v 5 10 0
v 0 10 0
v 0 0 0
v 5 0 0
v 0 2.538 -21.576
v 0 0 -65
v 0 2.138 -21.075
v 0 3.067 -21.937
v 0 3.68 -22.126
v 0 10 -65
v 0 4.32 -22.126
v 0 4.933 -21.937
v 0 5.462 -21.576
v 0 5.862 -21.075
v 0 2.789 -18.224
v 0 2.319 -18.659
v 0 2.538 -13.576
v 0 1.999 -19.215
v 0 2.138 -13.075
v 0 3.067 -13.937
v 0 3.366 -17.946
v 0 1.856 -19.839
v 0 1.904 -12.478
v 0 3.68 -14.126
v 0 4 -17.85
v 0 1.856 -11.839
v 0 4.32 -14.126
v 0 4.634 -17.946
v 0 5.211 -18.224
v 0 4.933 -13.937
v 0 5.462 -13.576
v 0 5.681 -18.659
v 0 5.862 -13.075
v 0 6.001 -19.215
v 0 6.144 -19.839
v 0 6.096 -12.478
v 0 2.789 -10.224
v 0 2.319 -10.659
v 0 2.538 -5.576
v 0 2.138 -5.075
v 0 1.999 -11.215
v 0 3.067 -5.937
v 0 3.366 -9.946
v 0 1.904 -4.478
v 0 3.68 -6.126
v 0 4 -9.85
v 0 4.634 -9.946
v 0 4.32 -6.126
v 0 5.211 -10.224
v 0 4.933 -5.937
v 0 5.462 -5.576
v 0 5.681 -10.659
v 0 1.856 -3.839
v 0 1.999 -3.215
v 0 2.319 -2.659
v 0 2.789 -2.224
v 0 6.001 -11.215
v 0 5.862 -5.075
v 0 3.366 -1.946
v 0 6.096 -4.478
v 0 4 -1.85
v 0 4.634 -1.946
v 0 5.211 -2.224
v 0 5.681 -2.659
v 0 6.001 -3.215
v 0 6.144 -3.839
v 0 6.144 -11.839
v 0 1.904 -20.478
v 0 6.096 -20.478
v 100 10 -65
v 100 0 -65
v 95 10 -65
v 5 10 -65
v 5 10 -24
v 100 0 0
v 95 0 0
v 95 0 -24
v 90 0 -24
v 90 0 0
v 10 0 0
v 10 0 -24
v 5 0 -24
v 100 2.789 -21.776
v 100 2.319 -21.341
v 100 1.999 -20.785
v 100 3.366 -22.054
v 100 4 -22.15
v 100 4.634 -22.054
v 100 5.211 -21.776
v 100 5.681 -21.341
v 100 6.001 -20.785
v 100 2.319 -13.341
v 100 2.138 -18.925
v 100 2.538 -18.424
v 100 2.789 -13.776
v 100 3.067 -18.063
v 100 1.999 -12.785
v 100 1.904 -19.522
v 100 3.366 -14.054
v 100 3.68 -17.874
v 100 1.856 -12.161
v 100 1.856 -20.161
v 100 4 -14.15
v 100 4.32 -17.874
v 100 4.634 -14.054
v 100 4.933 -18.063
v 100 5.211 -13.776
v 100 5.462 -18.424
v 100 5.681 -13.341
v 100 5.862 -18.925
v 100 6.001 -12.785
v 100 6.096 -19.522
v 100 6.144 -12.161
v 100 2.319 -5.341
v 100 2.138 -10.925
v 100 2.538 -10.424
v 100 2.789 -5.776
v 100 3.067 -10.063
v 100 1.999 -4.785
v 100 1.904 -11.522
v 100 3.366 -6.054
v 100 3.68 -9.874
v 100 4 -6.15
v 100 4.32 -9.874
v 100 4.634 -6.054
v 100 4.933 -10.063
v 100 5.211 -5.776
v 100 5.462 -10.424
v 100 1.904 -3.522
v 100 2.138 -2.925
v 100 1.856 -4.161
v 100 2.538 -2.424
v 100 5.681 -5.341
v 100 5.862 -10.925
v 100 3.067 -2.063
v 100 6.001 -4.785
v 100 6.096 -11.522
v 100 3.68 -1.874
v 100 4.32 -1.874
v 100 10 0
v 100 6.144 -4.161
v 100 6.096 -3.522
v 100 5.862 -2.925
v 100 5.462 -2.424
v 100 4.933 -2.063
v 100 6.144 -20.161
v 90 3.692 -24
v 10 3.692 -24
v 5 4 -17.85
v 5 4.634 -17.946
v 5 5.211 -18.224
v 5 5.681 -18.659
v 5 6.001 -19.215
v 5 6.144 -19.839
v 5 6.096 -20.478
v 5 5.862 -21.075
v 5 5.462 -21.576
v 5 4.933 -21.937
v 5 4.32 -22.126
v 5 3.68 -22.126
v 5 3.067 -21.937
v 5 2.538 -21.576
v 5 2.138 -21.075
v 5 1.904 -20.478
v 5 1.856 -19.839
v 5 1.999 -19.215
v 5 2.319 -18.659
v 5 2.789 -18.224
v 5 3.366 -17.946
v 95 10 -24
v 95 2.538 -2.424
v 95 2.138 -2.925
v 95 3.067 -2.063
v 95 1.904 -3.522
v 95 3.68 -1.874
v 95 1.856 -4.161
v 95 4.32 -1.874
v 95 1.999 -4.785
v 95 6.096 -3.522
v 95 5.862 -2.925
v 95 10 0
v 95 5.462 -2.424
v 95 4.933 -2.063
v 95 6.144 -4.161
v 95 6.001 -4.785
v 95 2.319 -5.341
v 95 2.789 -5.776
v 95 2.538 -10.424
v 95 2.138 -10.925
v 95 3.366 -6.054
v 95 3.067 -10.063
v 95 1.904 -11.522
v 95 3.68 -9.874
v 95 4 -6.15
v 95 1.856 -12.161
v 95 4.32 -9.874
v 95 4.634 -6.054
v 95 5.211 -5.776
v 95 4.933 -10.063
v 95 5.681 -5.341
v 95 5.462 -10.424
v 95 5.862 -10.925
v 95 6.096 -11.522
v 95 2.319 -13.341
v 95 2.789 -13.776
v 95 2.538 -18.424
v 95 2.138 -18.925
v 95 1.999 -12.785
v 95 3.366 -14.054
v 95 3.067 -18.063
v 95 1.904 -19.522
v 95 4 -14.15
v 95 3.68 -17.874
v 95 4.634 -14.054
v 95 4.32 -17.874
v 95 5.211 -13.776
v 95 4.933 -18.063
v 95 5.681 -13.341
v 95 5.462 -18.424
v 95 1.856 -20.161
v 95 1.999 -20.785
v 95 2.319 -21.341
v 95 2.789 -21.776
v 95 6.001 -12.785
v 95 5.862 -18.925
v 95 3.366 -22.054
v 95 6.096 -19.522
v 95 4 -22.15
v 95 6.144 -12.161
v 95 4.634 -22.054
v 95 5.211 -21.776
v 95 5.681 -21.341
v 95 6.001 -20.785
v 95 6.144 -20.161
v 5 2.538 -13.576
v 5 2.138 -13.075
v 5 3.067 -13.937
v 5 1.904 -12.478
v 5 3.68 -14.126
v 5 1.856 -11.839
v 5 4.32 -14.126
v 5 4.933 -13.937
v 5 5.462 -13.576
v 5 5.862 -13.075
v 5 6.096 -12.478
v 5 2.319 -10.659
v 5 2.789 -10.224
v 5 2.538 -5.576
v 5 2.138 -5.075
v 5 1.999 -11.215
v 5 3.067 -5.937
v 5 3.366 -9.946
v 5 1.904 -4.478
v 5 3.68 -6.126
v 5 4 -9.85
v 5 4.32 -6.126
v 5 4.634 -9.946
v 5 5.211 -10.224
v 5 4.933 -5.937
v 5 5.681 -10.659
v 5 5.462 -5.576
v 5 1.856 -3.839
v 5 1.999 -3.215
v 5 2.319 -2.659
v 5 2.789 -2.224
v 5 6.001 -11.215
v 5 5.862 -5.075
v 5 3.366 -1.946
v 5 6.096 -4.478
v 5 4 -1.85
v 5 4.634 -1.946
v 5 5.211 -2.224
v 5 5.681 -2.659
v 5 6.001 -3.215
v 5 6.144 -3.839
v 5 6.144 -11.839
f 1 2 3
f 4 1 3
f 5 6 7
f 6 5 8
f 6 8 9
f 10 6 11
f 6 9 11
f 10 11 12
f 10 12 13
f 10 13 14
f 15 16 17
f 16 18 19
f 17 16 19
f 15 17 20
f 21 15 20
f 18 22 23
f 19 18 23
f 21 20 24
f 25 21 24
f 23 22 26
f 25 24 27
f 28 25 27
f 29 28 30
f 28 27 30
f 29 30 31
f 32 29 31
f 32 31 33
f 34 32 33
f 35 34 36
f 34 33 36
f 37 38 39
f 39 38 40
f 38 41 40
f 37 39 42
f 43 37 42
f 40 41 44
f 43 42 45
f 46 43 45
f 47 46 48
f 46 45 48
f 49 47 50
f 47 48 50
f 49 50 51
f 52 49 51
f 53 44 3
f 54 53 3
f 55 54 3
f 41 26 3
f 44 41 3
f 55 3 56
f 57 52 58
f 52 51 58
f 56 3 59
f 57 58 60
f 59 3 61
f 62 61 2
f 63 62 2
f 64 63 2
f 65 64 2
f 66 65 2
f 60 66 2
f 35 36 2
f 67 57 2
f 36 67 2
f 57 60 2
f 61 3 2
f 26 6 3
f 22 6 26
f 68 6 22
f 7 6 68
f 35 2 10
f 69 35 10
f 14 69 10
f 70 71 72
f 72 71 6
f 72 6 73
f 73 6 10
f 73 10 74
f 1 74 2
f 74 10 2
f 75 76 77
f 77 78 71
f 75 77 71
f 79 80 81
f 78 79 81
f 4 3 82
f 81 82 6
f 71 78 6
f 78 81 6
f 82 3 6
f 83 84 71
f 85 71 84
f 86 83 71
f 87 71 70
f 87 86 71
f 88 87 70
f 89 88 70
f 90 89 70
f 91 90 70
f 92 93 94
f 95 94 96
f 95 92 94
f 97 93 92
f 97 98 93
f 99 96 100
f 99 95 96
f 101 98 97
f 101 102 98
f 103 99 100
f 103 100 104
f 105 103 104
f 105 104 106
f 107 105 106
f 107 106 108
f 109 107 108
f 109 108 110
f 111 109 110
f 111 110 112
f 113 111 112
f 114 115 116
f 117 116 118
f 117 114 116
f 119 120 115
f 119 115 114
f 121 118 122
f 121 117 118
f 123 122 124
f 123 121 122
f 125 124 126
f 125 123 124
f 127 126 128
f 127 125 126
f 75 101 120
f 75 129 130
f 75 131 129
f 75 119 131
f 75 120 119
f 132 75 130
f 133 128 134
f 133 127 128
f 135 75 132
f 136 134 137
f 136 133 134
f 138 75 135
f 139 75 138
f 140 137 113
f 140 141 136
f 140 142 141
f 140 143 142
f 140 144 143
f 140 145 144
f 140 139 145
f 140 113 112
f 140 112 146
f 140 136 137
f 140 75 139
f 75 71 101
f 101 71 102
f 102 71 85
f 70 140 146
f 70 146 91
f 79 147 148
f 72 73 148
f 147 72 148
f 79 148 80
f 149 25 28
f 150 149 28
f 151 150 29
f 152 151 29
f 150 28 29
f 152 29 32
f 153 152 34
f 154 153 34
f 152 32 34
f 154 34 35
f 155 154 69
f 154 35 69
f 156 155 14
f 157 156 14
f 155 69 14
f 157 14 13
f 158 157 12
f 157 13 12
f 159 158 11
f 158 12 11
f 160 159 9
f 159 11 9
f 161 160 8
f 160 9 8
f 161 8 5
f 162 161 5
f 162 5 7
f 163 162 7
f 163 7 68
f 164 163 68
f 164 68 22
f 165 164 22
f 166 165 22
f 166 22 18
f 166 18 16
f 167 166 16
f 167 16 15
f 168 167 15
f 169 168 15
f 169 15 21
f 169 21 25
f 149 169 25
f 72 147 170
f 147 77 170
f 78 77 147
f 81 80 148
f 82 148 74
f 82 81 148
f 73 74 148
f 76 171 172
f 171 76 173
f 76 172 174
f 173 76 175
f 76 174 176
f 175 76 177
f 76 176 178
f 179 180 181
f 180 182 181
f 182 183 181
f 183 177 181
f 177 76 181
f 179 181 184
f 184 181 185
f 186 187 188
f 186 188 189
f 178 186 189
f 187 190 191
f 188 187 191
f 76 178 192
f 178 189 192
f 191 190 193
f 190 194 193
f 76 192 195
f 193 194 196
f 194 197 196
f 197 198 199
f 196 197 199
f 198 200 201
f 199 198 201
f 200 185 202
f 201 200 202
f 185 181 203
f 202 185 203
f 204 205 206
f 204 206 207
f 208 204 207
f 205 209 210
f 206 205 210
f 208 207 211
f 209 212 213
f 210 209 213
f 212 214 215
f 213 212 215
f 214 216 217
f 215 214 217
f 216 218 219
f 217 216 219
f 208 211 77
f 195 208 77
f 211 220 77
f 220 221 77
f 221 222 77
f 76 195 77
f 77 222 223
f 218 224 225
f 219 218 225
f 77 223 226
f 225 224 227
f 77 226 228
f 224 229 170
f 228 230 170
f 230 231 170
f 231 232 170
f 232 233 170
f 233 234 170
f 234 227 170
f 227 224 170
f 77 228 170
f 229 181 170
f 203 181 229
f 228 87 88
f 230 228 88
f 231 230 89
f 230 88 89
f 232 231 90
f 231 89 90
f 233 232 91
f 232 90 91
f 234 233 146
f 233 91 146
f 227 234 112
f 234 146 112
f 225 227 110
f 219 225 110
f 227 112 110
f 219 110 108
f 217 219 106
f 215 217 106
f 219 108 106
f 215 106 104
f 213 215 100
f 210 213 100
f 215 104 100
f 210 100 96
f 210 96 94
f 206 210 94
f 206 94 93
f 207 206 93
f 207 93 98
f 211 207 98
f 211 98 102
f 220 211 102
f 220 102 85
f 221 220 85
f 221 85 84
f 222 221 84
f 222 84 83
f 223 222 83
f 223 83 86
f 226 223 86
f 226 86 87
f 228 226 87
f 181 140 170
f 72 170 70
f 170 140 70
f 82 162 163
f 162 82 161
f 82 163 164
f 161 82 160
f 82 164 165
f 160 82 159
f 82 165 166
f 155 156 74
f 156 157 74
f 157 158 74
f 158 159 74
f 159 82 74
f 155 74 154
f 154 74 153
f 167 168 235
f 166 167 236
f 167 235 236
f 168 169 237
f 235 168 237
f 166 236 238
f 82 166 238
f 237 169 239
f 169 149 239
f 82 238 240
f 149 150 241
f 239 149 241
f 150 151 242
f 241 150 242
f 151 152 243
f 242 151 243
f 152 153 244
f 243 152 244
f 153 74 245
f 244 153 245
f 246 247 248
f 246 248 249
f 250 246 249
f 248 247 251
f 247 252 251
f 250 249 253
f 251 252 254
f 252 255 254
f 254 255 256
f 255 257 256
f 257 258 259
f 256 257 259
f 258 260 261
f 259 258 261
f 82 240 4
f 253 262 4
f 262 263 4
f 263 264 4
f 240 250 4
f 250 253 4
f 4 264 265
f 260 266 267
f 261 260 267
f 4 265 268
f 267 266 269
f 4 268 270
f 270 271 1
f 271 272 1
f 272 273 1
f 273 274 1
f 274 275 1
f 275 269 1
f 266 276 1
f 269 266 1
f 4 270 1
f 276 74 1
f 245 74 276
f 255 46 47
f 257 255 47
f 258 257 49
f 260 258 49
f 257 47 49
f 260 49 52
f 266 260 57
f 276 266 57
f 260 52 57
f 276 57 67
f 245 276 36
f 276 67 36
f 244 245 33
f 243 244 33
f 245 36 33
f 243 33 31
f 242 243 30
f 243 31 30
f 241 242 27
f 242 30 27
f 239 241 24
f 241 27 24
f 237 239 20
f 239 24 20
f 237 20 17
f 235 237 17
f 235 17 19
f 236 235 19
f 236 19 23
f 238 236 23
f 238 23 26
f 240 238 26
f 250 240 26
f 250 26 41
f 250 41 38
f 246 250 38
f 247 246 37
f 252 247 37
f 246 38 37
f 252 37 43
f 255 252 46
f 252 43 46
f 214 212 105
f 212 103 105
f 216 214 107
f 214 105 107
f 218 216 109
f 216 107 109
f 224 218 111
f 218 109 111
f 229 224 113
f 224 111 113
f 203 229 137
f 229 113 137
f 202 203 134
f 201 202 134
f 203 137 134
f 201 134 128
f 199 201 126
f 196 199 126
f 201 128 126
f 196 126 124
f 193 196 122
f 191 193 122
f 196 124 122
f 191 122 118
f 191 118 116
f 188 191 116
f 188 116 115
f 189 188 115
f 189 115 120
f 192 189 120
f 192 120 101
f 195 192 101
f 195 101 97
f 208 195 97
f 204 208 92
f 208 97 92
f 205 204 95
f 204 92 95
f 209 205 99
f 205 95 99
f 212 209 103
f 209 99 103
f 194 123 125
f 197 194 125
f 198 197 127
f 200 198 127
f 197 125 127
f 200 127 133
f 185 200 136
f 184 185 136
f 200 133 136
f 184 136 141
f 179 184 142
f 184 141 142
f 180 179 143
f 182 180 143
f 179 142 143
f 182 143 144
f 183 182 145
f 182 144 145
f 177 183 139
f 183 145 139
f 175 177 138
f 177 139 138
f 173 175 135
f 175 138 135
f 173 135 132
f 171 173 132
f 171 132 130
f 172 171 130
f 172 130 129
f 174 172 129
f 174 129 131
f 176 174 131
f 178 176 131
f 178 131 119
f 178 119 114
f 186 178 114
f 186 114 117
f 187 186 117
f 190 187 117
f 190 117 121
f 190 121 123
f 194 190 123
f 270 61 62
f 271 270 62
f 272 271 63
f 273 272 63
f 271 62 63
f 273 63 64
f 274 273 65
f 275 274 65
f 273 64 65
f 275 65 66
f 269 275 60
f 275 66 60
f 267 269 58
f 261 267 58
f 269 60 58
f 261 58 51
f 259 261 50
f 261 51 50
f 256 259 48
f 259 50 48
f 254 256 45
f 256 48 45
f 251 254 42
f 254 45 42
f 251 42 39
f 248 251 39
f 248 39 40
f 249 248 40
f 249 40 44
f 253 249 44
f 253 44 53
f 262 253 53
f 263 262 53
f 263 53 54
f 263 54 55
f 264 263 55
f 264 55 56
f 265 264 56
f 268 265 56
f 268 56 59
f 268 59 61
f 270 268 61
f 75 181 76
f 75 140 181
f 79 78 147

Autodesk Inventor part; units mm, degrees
ref_plane "YZ Plane" through (0, 0, 0) normal (1, 0, 0) x (0, 1, 0)
ref_plane "XZ Plane" through (0, 0, 0) normal (0, 1, 0) x (-1, 0, 0)
ref_plane "XY Plane" through (0, 0, 0) normal (0, 0, 1) x (1, 0, 0)
sketch "Sketch1" plane through (0, 0, 0) normal (0, 1, 0) x (-1, 0, 0)
  point P0 (0, 0)
sketch "Sketch2" plane through (0, 0, 0) normal (1, 0, 0) x (0, 1, 0)
  line L0 (0, 0) -> (0, -65)
  line L1 (0, -65) -> (10, -65)
  line L2 (10, -65) -> (0, 0)
  dimension "d0" = 65
  dimension "d2" = 10
extrude "Extrusion1" add sketch "Sketch2" along normal blind 100
sketch "Sketch3" plane through (100, 0, 0) normal (1, 0, 0) x (0, 0, -1)
  line L0 (65, 10) -> (0, 0) projected
  line L1 (0, 0) -> (24, 0)
  line L2 (24, 0) -> (24, 3.6923)
  line L3 (24, 10) -> (0, 10)
  line L4 (0, 10) -> (0, 0)
  circle A0 centre (4, 4) radius 2.15
  circle A1 centre (12, 4) radius 2.15
  circle A2 centre (20, 4) radius 2.15
  line L5 (24, 10) -> (65, 10)
  line L6 (24, 3.6923) -> (65, 10)
  point P0 (0, 5)
  point P1 (12, 0)
  dimension "d5" = 24
  dimension "d6" = 10
  dimension "d7" = 4.3
  dimension "d9" = 4
  dimension "d10" = 4.3
  dimension "d11" = 8
  dimension "d12" = 4.3
  dimension "d13" = 8
  dimension "d38" = 4
  dimension "d39" = 4
  dimension "d40" = 4
sketch "Sketch4" plane through (0, 0, -65) normal (0, -1, 0) x (1, 0, 0)
  line L0 (0, 65) -> (100, 65) projected
  line L1 (85, 65) -> (90, 65)
  line L2 (100, 65) -> (100, 0) projected
  line L3 (85, 65) -> (100, 65)
  line L4 (100, 65) -> (100, 41)
  line L5 (100, 41) -> (90, 41)
  line L6 (100, 41) -> (90, 41)
  line L7 (90, 41) -> (90, 65)
  line L8 (90, 65) -> (100, 65)
  line L9 (100, 65) -> (100, 41)
  dimension "d24" = 10
extrude "Extrusion2" cut sketch "Sketch4" against normal blind 5
extrude "Extrusion3" add sketch "Sketch3" against normal blind 5 contours L0 A2 A1 L4 L3 L5 | L2 L1 L0 A1 A2
sketch "Sketch5" plane through (0, 0, -65) normal (0, -1, 0) x (1, 0, 0)
  line L0 (0, 65) -> (10, 65)
  line L1 (10, 65) -> (10, 41)
  line L2 (10, 41) -> (0, 41)
  line L3 (0, 41) -> (0, 65)
  dimension "d25" = 10
  dimension "d26" = 24
extrude "Extrusion4" cut sketch "Sketch5" against normal blind 5
sketch "Sketch6" plane through (0, 0, 0) normal (-1, 0, 0) x (0, 0, 1)
  line L0 (-65, 0) -> (-65, 10) projected
  line L1 (0, 0) -> (-65, 0)
  line L2 (-65, 0) -> (-65, 10)
  line L3 (-65, 10) -> (0, 10)
  line L4 (0, 10) -> (0, 0)
  circle A0 centre (-4, 4) radius 2.15
  circle A1 centre (-12, 4) radius 2.15
  circle A2 centre (-20, 4) radius 2.15
  dimension "d29" = 4.3
  dimension "d30" = 4
  dimension "d31" = 4
  dimension "d32" = 4.3
  dimension "d33" = 8
  dimension "d34" = 4.3
  dimension "d35" = 8
extrude "Extrusion5" add sketch "Sketch6" against normal blind 5
sketch "Sketch7" plane through (10, 0, -24) normal (0, 0, 1) x (1, 0, 0)
  line L0 (-5, 10) -> (85, 10) projected
  line L1 (0, 0) -> (0, 3.6923) projected
  line L2 (-5, 10) -> (0, 3.6923)
  line L3 (-5, 3.6923) -> (0, 3.6923) projected
  line L4 (0, 3.6923) -> (-5, 3.6923)
  line L5 (-5, 3.6923) -> (-5, 10)
  point P0 (-10, 0)
extrude "Extrusion6" add sketch "Sketch7" against normal blind 41
sketch "Sketch8" plane through (90, 0, -24) normal (0, 0, 1) x (1, 0, 0)
  line L0 (0, 3.6923) -> (5, 3.6923) projected
  line L1 (5, 3.6923) -> (5, 10) projected
  line L2 (0, 3.6923) -> (5, 10)
  line L3 (5, 10) -> (5, 3.6923)
  line L4 (5, 3.6923) -> (0, 3.6923)
  point P0 (-90, 0)
extrude "Extrusion7" add sketch "Sketch8" against normal blind 41
properties part number "slope"
